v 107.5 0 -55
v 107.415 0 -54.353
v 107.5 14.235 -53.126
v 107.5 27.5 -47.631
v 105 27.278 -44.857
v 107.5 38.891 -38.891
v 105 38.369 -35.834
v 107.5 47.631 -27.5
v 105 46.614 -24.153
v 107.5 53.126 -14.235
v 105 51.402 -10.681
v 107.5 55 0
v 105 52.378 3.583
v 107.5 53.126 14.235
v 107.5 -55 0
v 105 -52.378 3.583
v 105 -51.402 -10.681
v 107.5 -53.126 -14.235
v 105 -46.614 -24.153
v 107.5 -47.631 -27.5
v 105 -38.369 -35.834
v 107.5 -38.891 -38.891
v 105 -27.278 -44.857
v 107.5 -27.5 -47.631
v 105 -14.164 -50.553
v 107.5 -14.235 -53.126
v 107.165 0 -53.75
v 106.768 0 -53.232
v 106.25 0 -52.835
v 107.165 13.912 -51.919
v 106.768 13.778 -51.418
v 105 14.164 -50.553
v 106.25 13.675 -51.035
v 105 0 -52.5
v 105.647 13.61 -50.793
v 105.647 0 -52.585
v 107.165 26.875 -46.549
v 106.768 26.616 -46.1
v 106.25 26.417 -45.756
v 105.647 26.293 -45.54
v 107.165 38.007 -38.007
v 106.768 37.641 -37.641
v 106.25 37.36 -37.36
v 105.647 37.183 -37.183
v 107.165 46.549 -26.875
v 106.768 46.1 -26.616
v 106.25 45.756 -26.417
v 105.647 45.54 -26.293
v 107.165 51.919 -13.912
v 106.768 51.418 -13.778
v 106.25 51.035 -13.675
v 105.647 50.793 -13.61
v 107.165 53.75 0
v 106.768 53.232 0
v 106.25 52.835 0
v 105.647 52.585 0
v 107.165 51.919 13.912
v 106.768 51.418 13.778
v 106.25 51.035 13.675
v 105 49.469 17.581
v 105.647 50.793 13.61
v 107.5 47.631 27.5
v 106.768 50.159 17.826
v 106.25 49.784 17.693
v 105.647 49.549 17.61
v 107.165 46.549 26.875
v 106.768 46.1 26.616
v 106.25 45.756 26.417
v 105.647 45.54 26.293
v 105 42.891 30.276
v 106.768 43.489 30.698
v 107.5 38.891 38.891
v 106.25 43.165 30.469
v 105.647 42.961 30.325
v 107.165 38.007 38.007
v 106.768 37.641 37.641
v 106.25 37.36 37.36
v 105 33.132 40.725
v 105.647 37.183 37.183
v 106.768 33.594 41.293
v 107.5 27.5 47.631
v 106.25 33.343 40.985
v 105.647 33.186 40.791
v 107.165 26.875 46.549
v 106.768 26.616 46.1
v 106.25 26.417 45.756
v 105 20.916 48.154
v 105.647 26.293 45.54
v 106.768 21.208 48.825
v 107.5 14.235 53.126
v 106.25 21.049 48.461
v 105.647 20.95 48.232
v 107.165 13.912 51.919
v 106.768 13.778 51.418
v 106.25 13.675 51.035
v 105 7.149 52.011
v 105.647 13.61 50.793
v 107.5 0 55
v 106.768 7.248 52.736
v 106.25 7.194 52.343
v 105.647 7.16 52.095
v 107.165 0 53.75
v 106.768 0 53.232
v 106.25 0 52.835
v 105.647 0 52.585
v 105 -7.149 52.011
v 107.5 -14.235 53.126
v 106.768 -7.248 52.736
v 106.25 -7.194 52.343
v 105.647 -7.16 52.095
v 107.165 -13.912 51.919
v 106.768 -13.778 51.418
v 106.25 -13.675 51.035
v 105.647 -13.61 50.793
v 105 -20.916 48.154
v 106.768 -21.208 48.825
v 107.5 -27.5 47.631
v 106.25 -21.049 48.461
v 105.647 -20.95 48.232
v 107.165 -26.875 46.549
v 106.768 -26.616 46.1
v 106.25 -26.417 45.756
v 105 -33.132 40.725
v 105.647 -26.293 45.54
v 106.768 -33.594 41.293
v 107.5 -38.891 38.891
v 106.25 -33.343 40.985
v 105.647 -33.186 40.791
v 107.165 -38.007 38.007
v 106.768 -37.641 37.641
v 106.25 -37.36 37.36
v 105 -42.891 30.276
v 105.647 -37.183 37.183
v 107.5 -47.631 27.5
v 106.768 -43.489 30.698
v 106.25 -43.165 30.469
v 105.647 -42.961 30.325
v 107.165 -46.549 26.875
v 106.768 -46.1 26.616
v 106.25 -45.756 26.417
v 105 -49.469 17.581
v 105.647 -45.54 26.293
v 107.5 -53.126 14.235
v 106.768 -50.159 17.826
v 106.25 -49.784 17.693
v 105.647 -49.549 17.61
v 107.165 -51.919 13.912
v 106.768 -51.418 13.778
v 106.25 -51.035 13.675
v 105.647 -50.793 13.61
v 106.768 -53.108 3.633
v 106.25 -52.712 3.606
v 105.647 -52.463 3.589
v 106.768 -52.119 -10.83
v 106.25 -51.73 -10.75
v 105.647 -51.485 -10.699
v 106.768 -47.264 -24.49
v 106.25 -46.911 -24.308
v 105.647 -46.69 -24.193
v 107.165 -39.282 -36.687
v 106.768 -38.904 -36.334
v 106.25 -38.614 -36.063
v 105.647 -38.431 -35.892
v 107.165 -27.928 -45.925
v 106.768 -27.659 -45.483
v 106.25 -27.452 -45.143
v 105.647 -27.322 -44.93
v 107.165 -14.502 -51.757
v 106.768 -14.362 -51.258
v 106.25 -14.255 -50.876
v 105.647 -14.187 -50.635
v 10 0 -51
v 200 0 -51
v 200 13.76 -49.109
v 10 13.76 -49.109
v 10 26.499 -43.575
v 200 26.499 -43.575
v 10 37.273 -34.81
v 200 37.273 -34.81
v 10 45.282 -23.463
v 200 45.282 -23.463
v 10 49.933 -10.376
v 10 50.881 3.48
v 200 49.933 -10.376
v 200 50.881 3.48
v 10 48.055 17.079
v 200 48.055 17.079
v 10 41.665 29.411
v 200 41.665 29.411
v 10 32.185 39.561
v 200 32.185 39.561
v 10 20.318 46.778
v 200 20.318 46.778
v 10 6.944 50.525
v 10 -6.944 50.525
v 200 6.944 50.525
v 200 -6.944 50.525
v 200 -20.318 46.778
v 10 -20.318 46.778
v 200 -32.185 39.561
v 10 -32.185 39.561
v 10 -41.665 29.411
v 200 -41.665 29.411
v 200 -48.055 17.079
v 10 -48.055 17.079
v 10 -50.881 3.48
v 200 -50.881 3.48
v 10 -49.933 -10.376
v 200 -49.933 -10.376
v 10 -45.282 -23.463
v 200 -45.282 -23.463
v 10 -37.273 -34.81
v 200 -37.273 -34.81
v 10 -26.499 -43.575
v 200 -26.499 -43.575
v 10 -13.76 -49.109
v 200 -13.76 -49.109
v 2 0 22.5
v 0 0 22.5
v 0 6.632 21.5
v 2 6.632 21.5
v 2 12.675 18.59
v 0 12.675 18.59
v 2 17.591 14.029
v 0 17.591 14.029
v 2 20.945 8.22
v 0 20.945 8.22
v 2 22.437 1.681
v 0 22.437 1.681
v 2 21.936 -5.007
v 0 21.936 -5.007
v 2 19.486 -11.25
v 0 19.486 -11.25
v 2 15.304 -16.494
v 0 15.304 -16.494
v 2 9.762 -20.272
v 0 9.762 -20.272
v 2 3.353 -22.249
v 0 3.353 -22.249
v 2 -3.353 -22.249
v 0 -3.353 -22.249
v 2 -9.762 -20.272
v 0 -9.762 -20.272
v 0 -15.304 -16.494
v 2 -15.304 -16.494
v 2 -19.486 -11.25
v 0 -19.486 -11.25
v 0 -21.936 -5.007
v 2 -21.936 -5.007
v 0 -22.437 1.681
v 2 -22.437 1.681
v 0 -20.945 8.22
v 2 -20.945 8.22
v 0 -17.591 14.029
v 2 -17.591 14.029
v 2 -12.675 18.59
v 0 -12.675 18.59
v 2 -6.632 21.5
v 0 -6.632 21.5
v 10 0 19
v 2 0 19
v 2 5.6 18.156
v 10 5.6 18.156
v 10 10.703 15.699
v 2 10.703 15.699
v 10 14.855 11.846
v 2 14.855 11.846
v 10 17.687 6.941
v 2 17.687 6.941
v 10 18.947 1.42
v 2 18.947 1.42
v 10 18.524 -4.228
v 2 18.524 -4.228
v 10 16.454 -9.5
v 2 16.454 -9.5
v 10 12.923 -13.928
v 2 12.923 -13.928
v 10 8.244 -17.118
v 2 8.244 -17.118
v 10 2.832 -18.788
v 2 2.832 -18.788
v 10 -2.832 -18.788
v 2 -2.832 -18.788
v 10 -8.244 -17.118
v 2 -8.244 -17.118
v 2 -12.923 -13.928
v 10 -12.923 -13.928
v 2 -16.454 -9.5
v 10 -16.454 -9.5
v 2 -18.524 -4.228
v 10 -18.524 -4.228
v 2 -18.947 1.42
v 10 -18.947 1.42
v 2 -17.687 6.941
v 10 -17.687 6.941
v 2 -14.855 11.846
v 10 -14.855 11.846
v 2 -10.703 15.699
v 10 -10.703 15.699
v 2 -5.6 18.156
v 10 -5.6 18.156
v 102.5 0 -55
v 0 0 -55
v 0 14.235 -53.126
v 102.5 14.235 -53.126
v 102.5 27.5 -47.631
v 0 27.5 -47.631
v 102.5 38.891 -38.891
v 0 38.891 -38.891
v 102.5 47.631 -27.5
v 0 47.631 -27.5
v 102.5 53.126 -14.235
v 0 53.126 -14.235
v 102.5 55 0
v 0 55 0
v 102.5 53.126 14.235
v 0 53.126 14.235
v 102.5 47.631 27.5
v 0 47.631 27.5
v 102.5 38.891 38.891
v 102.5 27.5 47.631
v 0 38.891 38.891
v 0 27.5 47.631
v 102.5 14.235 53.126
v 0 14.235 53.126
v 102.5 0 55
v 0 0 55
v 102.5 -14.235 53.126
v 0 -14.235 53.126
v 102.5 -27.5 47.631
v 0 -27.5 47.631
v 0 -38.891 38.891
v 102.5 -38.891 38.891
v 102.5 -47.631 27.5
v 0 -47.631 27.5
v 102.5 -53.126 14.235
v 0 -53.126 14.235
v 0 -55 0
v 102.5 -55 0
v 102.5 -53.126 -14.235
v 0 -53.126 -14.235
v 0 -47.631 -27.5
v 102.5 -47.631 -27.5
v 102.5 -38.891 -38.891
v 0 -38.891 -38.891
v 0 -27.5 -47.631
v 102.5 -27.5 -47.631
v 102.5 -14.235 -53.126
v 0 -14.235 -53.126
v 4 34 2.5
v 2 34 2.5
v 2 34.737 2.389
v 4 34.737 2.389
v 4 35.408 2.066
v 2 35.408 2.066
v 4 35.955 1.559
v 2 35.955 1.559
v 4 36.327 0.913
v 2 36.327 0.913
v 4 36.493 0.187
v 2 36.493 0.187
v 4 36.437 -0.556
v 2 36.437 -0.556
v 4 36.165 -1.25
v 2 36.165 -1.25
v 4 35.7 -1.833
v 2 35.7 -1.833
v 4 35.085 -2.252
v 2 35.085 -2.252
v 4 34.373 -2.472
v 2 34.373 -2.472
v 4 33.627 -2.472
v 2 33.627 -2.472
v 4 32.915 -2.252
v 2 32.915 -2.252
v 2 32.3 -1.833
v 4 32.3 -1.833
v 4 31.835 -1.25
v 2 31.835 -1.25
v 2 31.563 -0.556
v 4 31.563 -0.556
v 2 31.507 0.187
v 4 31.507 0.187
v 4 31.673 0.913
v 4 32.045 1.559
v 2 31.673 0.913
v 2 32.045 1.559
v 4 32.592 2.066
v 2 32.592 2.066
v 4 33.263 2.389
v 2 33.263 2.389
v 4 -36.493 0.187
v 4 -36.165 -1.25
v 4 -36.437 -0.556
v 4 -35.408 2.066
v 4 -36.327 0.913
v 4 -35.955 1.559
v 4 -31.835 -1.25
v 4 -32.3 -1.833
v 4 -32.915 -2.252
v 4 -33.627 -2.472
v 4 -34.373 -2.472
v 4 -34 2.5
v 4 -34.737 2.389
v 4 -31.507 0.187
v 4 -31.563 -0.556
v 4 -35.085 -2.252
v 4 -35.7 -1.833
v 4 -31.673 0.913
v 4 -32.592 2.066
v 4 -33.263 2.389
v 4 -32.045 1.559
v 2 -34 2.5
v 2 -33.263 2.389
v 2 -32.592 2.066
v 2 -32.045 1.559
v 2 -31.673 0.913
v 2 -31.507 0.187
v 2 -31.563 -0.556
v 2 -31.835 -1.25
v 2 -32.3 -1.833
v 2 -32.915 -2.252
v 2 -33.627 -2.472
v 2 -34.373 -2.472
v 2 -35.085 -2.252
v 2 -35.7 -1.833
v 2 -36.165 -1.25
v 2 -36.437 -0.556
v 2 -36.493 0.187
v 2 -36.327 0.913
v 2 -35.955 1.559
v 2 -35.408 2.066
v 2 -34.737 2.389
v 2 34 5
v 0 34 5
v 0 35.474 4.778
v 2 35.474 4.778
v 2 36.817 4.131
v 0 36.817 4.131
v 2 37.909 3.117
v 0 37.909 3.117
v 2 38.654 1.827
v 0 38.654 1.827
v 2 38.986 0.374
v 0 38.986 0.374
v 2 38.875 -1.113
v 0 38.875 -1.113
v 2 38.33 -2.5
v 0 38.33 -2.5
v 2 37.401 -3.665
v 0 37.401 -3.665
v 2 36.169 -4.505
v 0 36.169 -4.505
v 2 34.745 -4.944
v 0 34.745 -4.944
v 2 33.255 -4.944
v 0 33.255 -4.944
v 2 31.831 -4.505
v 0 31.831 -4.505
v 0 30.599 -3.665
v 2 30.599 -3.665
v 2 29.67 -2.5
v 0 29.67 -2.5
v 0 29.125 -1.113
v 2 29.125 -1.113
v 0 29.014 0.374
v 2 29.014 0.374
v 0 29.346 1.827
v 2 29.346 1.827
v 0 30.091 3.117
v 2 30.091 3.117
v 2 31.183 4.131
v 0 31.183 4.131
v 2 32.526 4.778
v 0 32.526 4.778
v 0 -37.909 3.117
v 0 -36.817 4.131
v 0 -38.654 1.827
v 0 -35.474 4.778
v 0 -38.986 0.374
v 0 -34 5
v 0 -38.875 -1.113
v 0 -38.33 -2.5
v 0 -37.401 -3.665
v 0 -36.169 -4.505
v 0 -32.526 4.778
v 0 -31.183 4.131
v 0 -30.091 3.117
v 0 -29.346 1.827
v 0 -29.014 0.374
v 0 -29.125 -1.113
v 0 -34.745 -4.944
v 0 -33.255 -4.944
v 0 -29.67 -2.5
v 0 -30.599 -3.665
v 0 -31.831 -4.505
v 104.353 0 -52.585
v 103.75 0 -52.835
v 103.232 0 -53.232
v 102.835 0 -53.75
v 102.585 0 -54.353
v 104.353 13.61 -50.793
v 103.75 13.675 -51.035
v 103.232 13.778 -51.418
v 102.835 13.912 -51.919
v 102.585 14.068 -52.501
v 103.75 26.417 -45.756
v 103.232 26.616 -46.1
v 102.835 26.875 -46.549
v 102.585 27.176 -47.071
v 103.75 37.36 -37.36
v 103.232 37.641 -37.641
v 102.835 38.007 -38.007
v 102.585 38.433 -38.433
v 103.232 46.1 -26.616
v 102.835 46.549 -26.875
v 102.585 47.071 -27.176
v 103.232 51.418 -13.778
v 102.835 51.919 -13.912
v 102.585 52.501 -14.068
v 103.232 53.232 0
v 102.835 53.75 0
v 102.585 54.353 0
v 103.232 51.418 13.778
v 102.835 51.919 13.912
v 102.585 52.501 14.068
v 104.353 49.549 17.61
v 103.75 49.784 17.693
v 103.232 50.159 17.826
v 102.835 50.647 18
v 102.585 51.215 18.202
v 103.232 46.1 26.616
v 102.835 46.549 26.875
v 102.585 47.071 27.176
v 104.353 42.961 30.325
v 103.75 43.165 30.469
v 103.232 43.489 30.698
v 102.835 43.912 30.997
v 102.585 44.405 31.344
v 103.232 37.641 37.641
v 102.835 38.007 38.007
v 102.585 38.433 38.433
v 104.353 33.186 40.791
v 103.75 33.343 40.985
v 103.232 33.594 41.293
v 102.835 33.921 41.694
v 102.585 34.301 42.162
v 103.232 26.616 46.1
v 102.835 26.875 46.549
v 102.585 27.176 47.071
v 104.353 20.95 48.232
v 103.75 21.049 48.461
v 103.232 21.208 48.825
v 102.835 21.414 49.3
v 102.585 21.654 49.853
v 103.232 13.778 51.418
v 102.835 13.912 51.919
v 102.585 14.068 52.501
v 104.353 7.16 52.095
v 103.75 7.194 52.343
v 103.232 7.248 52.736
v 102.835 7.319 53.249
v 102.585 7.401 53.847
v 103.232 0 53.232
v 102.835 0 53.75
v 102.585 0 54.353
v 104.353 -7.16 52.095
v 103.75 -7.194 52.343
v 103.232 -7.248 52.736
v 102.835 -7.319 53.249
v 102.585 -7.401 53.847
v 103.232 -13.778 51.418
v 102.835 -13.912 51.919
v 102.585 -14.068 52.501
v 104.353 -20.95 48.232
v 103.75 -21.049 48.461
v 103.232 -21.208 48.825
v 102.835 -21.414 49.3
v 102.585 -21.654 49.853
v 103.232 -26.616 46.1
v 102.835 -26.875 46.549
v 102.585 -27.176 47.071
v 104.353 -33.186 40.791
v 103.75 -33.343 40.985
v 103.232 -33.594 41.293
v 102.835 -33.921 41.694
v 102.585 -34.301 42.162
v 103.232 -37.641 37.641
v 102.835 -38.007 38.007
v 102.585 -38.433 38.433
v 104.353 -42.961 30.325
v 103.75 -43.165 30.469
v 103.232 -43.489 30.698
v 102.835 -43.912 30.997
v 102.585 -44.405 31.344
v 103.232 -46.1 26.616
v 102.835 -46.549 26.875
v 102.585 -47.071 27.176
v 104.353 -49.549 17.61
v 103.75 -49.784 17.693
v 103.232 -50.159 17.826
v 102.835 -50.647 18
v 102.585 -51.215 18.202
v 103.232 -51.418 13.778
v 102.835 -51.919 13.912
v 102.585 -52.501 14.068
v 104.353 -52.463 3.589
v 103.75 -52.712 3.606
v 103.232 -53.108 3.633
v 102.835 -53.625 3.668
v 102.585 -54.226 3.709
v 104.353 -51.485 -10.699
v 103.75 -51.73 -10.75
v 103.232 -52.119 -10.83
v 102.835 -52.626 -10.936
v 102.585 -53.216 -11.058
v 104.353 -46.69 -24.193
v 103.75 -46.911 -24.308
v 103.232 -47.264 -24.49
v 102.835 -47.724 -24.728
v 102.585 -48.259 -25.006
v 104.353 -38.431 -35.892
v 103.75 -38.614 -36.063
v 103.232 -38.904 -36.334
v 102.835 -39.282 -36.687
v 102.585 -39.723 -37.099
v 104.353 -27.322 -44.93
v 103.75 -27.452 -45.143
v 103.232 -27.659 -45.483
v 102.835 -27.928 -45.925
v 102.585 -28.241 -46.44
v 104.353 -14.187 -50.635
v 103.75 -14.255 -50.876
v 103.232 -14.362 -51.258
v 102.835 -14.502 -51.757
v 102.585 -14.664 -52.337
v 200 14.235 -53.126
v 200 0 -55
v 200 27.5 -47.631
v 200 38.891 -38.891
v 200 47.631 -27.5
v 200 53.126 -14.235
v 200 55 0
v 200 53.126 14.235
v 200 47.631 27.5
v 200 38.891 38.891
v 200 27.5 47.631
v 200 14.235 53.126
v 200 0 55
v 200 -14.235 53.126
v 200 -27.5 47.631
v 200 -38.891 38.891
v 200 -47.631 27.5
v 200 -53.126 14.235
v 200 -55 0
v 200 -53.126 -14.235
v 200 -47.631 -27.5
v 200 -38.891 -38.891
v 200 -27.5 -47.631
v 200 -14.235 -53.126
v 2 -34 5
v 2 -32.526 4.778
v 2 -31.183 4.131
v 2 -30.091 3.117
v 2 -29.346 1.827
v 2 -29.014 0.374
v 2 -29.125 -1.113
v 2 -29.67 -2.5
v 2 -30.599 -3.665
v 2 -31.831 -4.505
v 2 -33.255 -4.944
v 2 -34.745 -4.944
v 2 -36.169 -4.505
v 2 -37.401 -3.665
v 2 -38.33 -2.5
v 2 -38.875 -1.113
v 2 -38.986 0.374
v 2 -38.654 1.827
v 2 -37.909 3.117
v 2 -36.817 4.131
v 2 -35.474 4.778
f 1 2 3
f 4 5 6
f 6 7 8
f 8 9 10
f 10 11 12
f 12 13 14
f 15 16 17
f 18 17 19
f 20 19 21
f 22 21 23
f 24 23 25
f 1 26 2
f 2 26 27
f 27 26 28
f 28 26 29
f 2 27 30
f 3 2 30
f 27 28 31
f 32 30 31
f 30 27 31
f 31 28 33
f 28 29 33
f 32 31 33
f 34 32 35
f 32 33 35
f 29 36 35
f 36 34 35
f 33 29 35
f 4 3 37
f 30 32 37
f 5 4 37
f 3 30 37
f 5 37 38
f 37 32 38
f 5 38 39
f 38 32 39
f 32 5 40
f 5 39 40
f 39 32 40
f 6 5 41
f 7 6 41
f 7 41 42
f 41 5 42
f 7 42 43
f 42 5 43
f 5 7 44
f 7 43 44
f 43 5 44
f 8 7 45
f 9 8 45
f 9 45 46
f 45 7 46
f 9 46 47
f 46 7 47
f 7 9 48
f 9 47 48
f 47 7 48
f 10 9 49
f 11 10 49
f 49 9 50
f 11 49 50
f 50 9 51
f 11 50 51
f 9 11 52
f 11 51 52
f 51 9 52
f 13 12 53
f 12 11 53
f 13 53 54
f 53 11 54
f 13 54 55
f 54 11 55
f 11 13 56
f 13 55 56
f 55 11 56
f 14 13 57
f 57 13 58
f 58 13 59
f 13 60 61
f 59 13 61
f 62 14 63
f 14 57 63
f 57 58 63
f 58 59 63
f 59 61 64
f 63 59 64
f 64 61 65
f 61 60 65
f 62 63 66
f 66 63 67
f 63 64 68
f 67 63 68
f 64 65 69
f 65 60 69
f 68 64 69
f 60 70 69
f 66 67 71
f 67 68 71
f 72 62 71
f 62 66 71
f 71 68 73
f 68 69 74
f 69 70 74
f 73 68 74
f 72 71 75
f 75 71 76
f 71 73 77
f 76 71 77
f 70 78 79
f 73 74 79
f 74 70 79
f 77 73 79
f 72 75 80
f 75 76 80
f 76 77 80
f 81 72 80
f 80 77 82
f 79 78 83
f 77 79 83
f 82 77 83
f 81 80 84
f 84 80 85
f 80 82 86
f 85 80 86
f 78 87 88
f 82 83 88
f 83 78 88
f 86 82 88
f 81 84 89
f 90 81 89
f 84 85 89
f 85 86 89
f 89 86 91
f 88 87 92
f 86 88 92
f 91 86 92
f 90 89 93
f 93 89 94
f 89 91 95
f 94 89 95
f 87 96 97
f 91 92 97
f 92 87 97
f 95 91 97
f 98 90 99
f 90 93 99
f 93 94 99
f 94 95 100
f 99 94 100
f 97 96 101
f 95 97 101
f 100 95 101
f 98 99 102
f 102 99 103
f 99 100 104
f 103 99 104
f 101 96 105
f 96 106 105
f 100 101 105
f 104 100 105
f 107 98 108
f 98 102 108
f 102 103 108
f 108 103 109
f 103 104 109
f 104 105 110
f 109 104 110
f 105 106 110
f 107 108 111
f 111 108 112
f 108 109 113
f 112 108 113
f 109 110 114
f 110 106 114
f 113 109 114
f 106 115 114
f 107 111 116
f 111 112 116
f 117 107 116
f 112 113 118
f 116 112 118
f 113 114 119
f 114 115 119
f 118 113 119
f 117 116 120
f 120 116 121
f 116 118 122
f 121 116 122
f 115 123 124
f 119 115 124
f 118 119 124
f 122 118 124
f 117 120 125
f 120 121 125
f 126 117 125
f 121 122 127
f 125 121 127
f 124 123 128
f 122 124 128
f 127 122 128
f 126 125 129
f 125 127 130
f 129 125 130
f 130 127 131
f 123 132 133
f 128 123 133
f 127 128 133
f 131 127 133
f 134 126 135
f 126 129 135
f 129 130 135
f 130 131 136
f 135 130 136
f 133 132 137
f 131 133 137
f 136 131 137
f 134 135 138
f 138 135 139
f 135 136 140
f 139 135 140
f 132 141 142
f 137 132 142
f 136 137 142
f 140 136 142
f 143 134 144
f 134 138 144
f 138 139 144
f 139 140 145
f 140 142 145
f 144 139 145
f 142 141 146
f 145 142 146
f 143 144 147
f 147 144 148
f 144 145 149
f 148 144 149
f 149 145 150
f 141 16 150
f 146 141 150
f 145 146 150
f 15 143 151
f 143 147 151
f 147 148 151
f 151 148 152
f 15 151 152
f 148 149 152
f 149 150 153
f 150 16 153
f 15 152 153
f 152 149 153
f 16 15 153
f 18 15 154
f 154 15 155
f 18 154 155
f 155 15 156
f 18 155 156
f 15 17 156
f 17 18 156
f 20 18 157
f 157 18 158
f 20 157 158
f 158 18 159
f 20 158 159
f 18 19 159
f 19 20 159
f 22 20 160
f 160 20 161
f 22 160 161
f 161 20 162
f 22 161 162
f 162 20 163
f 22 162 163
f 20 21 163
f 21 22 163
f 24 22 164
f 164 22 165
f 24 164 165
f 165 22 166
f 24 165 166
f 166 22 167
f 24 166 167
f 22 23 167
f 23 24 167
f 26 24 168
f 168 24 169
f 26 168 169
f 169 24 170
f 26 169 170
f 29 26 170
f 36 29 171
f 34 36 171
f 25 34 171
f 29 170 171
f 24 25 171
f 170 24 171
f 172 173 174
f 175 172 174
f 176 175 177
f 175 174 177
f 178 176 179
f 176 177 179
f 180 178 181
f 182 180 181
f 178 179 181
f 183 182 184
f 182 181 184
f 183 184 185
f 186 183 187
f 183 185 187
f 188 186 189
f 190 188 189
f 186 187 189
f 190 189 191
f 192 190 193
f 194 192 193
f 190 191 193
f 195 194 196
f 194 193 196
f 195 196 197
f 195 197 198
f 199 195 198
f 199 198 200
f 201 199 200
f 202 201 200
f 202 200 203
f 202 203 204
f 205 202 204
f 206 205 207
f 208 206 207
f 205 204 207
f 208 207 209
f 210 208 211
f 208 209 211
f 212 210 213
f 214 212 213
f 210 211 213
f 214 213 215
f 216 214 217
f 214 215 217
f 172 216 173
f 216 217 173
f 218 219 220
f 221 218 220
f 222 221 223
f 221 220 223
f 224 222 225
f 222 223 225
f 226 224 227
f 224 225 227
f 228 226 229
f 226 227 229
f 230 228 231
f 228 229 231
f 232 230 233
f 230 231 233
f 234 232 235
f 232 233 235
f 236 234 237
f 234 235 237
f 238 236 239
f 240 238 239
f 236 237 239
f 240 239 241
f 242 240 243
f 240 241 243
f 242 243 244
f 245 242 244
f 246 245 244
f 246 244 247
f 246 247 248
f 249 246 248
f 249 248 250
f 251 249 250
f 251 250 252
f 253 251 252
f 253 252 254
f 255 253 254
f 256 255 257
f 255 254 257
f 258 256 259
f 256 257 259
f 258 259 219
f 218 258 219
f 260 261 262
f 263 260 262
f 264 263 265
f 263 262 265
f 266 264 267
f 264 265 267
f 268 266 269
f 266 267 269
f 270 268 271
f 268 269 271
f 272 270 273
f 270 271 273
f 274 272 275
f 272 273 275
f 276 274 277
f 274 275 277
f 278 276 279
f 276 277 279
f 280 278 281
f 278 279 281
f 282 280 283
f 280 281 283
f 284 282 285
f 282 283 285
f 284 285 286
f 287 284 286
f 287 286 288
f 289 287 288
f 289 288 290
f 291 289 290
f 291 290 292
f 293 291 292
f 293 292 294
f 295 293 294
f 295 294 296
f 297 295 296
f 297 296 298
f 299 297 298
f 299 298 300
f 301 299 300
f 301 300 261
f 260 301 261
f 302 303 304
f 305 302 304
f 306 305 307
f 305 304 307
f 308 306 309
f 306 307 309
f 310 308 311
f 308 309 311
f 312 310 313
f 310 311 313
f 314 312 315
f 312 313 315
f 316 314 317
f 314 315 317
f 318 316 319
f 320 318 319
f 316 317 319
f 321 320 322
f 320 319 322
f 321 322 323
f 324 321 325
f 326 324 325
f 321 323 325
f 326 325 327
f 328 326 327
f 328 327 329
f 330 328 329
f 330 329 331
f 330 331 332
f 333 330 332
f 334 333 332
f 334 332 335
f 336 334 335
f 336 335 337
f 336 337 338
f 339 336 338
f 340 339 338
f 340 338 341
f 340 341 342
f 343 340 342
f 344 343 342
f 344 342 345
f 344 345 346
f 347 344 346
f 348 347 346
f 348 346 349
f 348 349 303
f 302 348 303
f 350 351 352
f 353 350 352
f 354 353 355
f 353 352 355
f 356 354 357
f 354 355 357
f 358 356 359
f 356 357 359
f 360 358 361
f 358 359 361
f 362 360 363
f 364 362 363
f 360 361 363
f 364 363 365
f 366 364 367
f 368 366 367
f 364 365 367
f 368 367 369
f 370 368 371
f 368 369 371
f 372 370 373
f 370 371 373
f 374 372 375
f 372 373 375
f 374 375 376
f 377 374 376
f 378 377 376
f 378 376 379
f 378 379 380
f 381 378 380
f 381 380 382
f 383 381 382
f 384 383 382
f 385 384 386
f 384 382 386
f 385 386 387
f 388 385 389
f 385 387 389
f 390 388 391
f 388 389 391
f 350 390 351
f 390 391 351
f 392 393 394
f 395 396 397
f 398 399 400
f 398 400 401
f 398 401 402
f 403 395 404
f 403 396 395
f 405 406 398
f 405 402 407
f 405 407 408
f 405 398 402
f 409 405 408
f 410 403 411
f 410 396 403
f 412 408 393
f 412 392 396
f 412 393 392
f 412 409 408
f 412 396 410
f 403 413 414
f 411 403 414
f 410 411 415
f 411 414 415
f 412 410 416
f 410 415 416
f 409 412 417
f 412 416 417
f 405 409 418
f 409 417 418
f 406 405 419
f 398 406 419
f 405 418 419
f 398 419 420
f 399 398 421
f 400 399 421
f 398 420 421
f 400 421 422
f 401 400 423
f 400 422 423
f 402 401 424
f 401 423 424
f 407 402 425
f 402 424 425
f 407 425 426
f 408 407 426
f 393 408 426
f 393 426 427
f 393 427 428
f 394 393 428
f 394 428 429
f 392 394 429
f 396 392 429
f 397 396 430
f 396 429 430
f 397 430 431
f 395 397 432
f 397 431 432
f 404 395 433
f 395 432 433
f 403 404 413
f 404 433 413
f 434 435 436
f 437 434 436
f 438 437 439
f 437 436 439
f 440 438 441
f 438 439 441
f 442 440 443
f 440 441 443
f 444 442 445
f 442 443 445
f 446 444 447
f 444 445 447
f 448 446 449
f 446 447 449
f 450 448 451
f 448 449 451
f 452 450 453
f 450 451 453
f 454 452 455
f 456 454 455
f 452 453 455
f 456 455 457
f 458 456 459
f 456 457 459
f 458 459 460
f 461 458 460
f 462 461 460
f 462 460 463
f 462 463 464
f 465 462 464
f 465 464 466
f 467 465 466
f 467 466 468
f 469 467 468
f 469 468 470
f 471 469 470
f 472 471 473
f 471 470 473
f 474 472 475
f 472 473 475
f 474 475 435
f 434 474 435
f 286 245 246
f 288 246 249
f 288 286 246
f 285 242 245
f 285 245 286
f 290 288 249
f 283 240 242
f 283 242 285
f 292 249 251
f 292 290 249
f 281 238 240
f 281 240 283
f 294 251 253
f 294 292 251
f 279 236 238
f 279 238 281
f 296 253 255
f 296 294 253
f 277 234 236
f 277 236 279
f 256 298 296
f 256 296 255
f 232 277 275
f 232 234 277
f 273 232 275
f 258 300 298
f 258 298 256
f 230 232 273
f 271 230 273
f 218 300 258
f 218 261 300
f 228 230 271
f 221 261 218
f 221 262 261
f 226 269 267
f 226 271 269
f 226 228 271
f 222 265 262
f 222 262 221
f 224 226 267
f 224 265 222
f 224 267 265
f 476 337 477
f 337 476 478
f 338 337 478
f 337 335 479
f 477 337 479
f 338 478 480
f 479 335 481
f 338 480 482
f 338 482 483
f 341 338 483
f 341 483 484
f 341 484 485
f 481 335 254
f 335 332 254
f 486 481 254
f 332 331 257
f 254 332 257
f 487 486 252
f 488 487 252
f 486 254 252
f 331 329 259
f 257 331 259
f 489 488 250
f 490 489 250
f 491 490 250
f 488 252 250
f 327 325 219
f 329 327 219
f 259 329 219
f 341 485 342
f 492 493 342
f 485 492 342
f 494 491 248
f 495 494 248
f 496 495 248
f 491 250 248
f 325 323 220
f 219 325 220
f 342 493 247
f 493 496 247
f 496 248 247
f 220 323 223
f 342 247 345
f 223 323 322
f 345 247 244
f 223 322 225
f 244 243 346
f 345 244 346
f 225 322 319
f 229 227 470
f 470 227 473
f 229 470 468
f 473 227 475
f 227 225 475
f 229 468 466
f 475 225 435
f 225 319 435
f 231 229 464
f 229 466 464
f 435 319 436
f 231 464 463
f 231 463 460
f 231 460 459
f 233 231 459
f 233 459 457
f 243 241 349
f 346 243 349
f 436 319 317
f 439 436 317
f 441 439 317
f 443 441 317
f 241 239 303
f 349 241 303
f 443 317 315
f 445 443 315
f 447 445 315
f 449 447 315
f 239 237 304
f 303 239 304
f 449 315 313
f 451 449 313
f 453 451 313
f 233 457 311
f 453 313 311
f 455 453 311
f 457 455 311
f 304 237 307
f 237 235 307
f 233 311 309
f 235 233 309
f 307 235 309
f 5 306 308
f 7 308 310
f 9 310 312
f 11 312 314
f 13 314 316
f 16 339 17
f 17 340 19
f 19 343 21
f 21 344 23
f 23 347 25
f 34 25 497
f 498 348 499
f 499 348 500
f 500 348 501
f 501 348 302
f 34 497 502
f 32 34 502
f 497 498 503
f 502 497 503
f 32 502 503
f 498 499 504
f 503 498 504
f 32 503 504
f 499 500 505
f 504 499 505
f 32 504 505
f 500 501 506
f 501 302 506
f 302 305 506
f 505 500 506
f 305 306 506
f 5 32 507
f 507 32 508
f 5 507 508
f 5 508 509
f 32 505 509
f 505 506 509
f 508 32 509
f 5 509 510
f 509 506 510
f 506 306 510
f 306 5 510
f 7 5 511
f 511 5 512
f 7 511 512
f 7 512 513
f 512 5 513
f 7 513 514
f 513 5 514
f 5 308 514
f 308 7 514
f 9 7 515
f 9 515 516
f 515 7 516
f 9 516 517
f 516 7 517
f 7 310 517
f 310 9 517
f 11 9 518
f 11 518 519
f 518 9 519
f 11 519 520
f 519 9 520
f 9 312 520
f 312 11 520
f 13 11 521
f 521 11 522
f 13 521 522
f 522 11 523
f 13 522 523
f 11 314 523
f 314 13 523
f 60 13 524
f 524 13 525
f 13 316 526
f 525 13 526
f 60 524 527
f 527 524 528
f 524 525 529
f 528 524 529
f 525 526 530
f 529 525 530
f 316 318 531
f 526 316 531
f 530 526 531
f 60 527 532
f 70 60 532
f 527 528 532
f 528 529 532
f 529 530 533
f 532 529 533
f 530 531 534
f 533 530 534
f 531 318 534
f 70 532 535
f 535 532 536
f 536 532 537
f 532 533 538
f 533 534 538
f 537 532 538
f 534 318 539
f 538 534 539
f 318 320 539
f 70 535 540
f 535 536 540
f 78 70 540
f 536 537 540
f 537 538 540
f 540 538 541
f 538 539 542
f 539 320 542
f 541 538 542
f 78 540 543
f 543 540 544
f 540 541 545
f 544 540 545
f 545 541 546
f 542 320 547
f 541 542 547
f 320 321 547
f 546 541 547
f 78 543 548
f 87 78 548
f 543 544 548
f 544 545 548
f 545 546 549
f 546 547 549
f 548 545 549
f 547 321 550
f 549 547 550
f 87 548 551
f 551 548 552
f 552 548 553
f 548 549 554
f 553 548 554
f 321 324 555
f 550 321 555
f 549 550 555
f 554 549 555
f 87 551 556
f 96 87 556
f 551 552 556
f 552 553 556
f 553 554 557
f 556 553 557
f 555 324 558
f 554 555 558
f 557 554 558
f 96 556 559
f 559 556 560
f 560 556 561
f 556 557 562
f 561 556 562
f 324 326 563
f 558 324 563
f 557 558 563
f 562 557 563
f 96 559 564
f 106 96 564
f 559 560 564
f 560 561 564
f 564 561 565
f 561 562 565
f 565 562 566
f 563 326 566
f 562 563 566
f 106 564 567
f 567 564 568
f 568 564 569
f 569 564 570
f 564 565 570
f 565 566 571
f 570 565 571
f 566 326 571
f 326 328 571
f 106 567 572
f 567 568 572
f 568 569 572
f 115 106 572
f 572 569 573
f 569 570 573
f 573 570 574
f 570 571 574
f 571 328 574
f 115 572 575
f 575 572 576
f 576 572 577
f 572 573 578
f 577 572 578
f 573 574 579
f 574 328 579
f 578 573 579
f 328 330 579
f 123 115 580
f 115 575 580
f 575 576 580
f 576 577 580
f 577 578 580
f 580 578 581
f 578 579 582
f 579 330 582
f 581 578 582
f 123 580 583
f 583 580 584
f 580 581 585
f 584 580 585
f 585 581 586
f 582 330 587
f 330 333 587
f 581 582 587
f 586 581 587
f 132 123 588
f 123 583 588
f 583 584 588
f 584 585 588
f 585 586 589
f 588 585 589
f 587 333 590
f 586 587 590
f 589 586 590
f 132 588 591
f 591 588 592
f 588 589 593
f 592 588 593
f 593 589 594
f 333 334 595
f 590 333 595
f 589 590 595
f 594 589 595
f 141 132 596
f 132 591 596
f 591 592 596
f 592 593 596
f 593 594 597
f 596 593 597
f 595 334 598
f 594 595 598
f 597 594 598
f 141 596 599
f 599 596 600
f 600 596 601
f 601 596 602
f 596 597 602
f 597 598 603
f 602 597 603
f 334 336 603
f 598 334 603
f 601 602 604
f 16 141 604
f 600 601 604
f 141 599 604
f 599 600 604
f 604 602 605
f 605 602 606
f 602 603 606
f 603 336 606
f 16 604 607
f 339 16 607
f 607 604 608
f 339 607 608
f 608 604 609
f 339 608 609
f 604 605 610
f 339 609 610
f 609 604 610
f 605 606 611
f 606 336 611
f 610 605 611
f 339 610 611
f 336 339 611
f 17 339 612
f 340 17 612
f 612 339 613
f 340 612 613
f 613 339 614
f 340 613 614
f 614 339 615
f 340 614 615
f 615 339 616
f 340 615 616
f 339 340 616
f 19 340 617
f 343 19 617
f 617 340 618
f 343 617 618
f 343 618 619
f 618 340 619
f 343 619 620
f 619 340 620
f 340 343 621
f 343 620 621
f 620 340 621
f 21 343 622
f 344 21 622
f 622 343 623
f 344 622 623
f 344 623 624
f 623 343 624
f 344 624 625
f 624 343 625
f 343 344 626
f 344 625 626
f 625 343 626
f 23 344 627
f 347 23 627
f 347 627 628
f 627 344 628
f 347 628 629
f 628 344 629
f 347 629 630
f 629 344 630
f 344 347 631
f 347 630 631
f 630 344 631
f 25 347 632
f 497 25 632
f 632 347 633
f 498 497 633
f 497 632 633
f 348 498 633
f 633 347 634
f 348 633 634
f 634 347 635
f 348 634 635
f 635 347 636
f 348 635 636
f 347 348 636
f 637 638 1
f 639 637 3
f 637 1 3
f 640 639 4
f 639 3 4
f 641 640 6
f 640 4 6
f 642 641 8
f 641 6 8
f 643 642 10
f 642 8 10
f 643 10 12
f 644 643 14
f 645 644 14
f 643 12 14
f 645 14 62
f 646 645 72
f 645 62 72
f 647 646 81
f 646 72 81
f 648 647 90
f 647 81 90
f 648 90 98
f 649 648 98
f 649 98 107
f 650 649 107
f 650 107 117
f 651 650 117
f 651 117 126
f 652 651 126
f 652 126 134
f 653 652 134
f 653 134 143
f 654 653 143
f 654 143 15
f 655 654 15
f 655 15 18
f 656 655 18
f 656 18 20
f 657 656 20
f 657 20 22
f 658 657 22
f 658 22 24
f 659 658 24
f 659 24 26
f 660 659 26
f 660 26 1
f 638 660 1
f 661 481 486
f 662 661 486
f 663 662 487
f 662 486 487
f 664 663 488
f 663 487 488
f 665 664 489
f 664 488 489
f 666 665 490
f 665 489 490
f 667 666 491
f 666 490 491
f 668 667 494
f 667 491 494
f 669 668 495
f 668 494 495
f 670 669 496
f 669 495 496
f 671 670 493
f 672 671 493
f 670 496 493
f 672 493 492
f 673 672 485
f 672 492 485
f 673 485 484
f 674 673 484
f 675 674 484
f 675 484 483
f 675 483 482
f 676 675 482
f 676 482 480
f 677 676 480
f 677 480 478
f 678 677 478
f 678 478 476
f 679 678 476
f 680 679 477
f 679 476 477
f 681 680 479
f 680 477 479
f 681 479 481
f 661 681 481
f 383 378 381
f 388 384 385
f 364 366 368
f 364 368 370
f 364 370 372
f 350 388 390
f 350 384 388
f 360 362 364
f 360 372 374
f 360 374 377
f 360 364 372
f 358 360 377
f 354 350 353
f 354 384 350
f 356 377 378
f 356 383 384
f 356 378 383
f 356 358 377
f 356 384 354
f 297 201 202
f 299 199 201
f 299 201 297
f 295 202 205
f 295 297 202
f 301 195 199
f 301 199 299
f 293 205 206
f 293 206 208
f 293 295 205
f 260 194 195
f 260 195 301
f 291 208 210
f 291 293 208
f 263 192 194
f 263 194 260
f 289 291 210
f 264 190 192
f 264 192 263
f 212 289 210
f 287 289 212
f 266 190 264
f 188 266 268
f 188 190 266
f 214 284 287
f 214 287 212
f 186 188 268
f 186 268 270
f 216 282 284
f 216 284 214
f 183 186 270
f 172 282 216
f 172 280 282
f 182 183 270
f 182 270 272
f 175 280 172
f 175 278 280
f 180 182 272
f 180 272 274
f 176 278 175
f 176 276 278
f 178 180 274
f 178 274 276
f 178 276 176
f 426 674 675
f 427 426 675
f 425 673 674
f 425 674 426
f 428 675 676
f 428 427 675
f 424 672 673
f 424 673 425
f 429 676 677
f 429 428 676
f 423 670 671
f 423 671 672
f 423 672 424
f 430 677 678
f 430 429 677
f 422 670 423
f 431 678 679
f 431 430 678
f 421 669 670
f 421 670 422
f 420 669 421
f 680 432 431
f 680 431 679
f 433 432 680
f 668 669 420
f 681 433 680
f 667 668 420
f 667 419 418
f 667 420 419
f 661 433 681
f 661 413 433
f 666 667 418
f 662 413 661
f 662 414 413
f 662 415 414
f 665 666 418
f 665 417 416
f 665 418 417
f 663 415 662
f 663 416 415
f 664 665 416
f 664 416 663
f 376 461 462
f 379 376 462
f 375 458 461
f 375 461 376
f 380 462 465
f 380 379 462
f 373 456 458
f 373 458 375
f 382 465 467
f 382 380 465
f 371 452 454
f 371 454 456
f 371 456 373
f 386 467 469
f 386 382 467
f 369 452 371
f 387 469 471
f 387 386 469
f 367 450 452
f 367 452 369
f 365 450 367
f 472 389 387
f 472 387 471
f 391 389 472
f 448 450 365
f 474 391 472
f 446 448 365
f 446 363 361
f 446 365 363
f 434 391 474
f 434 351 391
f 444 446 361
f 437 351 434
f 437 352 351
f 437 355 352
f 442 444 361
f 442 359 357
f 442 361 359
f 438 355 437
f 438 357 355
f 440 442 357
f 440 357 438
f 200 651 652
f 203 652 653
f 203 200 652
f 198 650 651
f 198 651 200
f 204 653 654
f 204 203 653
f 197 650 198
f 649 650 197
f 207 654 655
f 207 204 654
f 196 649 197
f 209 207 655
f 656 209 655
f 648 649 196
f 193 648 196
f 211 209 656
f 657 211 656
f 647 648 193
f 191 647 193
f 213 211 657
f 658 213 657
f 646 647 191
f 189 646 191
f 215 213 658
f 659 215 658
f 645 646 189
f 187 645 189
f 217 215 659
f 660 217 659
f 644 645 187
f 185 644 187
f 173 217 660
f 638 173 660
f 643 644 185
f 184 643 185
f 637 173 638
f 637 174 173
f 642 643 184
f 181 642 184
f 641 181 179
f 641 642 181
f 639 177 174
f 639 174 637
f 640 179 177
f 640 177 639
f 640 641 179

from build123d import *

# Parameters (mm, degrees)
SKETCH1_R               = 55
BOSS_EXTRUDE1_DEPTH     = 200
SKETCH2_R               = 51
CUT_EXTRUDE1_DEPTH      = 190
SKETCH3_R               = 19
CUT_EXTRUDE2_DEPTH      = 1
CUT_EXTRUDE2_DEPTH_BACK = 201
SKETCH4_R               = 5
CUT_EXTRUDE3_DEPTH      = 2
SKETCH5_R               = 22.5
CUT_EXTRUDE4_DEPTH      = 2
CUT_SWEEP1_PROFILE_R    = 2.5
SKETCH58_R              = 2.5
CUT_EXTRUDE5_DEPTH      = 2


with BuildPart() as part:
    # Sketch1 → Boss-Extrude1 (new body)
    with BuildSketch(Plane(origin=(0, 0, 0), x_dir=(0, 0, -1), z_dir=(1, 0, 0))):
        Circle(SKETCH1_R)
    extrude(amount=BOSS_EXTRUDE1_DEPTH)

    # Sketch2 → Cut-Extrude1 (cut)
    with BuildSketch(Plane(origin=(200, 0, 0), x_dir=(0, 0, -1), z_dir=(1, 0, 0))):
        Circle(SKETCH2_R)
    extrude(amount=-CUT_EXTRUDE1_DEPTH, mode=Mode.SUBTRACT)

    # Sketch3 → Cut-Extrude2 (cut, two sides)
    with BuildSketch(Plane.ZY) as cut_extrude2_sk:
        Circle(SKETCH3_R)
    extrude(amount=CUT_EXTRUDE2_DEPTH, mode=Mode.SUBTRACT)
    extrude(cut_extrude2_sk.sketch, amount=-CUT_EXTRUDE2_DEPTH_BACK, mode=Mode.SUBTRACT)

    # Sketch4 → Cut-Extrude3 (cut)
    with BuildSketch(Plane.ZY):
        with Locations((0, 34)):
            Circle(SKETCH4_R)
        with Locations((0, -34)):
            Circle(SKETCH4_R)
    extrude(amount=-CUT_EXTRUDE3_DEPTH, mode=Mode.SUBTRACT)

    # Sketch5 → Cut-Extrude4 (cut)
    with BuildSketch(Plane.ZY):
        Circle(SKETCH5_R)
    extrude(amount=-CUT_EXTRUDE4_DEPTH, mode=Mode.SUBTRACT)

    # Cut-Sweep1: sweep along a path in Sketch57
    with BuildLine(Plane(origin=(105, 0, 0), x_dir=(0, 0, -1), z_dir=(1, 0, 0))) as cut_sweep1_path:
        CenterArc((0, 0), 55, 0, 360)
    # Cut-Sweep1 profile (on start of the path) → Cut-Sweep1 (sweep, cut)
    with BuildSketch(Plane(origin=(105, 0, -55), x_dir=(0, 0, 1), z_dir=(0, 1, 0))):
        Circle(CUT_SWEEP1_PROFILE_R)
    sweep(path=cut_sweep1_path.line, mode=Mode.SUBTRACT)

    # Sketch58 → Cut-Extrude5 (cut)
    with BuildSketch(Plane.ZY.offset(-2)):
        with Locations((0, 34)):
            Circle(SKETCH58_R)
        with Locations((0, -34)):
            Circle(SKETCH58_R)
    extrude(amount=-CUT_EXTRUDE5_DEPTH, mode=Mode.SUBTRACT)


solid = part.part
